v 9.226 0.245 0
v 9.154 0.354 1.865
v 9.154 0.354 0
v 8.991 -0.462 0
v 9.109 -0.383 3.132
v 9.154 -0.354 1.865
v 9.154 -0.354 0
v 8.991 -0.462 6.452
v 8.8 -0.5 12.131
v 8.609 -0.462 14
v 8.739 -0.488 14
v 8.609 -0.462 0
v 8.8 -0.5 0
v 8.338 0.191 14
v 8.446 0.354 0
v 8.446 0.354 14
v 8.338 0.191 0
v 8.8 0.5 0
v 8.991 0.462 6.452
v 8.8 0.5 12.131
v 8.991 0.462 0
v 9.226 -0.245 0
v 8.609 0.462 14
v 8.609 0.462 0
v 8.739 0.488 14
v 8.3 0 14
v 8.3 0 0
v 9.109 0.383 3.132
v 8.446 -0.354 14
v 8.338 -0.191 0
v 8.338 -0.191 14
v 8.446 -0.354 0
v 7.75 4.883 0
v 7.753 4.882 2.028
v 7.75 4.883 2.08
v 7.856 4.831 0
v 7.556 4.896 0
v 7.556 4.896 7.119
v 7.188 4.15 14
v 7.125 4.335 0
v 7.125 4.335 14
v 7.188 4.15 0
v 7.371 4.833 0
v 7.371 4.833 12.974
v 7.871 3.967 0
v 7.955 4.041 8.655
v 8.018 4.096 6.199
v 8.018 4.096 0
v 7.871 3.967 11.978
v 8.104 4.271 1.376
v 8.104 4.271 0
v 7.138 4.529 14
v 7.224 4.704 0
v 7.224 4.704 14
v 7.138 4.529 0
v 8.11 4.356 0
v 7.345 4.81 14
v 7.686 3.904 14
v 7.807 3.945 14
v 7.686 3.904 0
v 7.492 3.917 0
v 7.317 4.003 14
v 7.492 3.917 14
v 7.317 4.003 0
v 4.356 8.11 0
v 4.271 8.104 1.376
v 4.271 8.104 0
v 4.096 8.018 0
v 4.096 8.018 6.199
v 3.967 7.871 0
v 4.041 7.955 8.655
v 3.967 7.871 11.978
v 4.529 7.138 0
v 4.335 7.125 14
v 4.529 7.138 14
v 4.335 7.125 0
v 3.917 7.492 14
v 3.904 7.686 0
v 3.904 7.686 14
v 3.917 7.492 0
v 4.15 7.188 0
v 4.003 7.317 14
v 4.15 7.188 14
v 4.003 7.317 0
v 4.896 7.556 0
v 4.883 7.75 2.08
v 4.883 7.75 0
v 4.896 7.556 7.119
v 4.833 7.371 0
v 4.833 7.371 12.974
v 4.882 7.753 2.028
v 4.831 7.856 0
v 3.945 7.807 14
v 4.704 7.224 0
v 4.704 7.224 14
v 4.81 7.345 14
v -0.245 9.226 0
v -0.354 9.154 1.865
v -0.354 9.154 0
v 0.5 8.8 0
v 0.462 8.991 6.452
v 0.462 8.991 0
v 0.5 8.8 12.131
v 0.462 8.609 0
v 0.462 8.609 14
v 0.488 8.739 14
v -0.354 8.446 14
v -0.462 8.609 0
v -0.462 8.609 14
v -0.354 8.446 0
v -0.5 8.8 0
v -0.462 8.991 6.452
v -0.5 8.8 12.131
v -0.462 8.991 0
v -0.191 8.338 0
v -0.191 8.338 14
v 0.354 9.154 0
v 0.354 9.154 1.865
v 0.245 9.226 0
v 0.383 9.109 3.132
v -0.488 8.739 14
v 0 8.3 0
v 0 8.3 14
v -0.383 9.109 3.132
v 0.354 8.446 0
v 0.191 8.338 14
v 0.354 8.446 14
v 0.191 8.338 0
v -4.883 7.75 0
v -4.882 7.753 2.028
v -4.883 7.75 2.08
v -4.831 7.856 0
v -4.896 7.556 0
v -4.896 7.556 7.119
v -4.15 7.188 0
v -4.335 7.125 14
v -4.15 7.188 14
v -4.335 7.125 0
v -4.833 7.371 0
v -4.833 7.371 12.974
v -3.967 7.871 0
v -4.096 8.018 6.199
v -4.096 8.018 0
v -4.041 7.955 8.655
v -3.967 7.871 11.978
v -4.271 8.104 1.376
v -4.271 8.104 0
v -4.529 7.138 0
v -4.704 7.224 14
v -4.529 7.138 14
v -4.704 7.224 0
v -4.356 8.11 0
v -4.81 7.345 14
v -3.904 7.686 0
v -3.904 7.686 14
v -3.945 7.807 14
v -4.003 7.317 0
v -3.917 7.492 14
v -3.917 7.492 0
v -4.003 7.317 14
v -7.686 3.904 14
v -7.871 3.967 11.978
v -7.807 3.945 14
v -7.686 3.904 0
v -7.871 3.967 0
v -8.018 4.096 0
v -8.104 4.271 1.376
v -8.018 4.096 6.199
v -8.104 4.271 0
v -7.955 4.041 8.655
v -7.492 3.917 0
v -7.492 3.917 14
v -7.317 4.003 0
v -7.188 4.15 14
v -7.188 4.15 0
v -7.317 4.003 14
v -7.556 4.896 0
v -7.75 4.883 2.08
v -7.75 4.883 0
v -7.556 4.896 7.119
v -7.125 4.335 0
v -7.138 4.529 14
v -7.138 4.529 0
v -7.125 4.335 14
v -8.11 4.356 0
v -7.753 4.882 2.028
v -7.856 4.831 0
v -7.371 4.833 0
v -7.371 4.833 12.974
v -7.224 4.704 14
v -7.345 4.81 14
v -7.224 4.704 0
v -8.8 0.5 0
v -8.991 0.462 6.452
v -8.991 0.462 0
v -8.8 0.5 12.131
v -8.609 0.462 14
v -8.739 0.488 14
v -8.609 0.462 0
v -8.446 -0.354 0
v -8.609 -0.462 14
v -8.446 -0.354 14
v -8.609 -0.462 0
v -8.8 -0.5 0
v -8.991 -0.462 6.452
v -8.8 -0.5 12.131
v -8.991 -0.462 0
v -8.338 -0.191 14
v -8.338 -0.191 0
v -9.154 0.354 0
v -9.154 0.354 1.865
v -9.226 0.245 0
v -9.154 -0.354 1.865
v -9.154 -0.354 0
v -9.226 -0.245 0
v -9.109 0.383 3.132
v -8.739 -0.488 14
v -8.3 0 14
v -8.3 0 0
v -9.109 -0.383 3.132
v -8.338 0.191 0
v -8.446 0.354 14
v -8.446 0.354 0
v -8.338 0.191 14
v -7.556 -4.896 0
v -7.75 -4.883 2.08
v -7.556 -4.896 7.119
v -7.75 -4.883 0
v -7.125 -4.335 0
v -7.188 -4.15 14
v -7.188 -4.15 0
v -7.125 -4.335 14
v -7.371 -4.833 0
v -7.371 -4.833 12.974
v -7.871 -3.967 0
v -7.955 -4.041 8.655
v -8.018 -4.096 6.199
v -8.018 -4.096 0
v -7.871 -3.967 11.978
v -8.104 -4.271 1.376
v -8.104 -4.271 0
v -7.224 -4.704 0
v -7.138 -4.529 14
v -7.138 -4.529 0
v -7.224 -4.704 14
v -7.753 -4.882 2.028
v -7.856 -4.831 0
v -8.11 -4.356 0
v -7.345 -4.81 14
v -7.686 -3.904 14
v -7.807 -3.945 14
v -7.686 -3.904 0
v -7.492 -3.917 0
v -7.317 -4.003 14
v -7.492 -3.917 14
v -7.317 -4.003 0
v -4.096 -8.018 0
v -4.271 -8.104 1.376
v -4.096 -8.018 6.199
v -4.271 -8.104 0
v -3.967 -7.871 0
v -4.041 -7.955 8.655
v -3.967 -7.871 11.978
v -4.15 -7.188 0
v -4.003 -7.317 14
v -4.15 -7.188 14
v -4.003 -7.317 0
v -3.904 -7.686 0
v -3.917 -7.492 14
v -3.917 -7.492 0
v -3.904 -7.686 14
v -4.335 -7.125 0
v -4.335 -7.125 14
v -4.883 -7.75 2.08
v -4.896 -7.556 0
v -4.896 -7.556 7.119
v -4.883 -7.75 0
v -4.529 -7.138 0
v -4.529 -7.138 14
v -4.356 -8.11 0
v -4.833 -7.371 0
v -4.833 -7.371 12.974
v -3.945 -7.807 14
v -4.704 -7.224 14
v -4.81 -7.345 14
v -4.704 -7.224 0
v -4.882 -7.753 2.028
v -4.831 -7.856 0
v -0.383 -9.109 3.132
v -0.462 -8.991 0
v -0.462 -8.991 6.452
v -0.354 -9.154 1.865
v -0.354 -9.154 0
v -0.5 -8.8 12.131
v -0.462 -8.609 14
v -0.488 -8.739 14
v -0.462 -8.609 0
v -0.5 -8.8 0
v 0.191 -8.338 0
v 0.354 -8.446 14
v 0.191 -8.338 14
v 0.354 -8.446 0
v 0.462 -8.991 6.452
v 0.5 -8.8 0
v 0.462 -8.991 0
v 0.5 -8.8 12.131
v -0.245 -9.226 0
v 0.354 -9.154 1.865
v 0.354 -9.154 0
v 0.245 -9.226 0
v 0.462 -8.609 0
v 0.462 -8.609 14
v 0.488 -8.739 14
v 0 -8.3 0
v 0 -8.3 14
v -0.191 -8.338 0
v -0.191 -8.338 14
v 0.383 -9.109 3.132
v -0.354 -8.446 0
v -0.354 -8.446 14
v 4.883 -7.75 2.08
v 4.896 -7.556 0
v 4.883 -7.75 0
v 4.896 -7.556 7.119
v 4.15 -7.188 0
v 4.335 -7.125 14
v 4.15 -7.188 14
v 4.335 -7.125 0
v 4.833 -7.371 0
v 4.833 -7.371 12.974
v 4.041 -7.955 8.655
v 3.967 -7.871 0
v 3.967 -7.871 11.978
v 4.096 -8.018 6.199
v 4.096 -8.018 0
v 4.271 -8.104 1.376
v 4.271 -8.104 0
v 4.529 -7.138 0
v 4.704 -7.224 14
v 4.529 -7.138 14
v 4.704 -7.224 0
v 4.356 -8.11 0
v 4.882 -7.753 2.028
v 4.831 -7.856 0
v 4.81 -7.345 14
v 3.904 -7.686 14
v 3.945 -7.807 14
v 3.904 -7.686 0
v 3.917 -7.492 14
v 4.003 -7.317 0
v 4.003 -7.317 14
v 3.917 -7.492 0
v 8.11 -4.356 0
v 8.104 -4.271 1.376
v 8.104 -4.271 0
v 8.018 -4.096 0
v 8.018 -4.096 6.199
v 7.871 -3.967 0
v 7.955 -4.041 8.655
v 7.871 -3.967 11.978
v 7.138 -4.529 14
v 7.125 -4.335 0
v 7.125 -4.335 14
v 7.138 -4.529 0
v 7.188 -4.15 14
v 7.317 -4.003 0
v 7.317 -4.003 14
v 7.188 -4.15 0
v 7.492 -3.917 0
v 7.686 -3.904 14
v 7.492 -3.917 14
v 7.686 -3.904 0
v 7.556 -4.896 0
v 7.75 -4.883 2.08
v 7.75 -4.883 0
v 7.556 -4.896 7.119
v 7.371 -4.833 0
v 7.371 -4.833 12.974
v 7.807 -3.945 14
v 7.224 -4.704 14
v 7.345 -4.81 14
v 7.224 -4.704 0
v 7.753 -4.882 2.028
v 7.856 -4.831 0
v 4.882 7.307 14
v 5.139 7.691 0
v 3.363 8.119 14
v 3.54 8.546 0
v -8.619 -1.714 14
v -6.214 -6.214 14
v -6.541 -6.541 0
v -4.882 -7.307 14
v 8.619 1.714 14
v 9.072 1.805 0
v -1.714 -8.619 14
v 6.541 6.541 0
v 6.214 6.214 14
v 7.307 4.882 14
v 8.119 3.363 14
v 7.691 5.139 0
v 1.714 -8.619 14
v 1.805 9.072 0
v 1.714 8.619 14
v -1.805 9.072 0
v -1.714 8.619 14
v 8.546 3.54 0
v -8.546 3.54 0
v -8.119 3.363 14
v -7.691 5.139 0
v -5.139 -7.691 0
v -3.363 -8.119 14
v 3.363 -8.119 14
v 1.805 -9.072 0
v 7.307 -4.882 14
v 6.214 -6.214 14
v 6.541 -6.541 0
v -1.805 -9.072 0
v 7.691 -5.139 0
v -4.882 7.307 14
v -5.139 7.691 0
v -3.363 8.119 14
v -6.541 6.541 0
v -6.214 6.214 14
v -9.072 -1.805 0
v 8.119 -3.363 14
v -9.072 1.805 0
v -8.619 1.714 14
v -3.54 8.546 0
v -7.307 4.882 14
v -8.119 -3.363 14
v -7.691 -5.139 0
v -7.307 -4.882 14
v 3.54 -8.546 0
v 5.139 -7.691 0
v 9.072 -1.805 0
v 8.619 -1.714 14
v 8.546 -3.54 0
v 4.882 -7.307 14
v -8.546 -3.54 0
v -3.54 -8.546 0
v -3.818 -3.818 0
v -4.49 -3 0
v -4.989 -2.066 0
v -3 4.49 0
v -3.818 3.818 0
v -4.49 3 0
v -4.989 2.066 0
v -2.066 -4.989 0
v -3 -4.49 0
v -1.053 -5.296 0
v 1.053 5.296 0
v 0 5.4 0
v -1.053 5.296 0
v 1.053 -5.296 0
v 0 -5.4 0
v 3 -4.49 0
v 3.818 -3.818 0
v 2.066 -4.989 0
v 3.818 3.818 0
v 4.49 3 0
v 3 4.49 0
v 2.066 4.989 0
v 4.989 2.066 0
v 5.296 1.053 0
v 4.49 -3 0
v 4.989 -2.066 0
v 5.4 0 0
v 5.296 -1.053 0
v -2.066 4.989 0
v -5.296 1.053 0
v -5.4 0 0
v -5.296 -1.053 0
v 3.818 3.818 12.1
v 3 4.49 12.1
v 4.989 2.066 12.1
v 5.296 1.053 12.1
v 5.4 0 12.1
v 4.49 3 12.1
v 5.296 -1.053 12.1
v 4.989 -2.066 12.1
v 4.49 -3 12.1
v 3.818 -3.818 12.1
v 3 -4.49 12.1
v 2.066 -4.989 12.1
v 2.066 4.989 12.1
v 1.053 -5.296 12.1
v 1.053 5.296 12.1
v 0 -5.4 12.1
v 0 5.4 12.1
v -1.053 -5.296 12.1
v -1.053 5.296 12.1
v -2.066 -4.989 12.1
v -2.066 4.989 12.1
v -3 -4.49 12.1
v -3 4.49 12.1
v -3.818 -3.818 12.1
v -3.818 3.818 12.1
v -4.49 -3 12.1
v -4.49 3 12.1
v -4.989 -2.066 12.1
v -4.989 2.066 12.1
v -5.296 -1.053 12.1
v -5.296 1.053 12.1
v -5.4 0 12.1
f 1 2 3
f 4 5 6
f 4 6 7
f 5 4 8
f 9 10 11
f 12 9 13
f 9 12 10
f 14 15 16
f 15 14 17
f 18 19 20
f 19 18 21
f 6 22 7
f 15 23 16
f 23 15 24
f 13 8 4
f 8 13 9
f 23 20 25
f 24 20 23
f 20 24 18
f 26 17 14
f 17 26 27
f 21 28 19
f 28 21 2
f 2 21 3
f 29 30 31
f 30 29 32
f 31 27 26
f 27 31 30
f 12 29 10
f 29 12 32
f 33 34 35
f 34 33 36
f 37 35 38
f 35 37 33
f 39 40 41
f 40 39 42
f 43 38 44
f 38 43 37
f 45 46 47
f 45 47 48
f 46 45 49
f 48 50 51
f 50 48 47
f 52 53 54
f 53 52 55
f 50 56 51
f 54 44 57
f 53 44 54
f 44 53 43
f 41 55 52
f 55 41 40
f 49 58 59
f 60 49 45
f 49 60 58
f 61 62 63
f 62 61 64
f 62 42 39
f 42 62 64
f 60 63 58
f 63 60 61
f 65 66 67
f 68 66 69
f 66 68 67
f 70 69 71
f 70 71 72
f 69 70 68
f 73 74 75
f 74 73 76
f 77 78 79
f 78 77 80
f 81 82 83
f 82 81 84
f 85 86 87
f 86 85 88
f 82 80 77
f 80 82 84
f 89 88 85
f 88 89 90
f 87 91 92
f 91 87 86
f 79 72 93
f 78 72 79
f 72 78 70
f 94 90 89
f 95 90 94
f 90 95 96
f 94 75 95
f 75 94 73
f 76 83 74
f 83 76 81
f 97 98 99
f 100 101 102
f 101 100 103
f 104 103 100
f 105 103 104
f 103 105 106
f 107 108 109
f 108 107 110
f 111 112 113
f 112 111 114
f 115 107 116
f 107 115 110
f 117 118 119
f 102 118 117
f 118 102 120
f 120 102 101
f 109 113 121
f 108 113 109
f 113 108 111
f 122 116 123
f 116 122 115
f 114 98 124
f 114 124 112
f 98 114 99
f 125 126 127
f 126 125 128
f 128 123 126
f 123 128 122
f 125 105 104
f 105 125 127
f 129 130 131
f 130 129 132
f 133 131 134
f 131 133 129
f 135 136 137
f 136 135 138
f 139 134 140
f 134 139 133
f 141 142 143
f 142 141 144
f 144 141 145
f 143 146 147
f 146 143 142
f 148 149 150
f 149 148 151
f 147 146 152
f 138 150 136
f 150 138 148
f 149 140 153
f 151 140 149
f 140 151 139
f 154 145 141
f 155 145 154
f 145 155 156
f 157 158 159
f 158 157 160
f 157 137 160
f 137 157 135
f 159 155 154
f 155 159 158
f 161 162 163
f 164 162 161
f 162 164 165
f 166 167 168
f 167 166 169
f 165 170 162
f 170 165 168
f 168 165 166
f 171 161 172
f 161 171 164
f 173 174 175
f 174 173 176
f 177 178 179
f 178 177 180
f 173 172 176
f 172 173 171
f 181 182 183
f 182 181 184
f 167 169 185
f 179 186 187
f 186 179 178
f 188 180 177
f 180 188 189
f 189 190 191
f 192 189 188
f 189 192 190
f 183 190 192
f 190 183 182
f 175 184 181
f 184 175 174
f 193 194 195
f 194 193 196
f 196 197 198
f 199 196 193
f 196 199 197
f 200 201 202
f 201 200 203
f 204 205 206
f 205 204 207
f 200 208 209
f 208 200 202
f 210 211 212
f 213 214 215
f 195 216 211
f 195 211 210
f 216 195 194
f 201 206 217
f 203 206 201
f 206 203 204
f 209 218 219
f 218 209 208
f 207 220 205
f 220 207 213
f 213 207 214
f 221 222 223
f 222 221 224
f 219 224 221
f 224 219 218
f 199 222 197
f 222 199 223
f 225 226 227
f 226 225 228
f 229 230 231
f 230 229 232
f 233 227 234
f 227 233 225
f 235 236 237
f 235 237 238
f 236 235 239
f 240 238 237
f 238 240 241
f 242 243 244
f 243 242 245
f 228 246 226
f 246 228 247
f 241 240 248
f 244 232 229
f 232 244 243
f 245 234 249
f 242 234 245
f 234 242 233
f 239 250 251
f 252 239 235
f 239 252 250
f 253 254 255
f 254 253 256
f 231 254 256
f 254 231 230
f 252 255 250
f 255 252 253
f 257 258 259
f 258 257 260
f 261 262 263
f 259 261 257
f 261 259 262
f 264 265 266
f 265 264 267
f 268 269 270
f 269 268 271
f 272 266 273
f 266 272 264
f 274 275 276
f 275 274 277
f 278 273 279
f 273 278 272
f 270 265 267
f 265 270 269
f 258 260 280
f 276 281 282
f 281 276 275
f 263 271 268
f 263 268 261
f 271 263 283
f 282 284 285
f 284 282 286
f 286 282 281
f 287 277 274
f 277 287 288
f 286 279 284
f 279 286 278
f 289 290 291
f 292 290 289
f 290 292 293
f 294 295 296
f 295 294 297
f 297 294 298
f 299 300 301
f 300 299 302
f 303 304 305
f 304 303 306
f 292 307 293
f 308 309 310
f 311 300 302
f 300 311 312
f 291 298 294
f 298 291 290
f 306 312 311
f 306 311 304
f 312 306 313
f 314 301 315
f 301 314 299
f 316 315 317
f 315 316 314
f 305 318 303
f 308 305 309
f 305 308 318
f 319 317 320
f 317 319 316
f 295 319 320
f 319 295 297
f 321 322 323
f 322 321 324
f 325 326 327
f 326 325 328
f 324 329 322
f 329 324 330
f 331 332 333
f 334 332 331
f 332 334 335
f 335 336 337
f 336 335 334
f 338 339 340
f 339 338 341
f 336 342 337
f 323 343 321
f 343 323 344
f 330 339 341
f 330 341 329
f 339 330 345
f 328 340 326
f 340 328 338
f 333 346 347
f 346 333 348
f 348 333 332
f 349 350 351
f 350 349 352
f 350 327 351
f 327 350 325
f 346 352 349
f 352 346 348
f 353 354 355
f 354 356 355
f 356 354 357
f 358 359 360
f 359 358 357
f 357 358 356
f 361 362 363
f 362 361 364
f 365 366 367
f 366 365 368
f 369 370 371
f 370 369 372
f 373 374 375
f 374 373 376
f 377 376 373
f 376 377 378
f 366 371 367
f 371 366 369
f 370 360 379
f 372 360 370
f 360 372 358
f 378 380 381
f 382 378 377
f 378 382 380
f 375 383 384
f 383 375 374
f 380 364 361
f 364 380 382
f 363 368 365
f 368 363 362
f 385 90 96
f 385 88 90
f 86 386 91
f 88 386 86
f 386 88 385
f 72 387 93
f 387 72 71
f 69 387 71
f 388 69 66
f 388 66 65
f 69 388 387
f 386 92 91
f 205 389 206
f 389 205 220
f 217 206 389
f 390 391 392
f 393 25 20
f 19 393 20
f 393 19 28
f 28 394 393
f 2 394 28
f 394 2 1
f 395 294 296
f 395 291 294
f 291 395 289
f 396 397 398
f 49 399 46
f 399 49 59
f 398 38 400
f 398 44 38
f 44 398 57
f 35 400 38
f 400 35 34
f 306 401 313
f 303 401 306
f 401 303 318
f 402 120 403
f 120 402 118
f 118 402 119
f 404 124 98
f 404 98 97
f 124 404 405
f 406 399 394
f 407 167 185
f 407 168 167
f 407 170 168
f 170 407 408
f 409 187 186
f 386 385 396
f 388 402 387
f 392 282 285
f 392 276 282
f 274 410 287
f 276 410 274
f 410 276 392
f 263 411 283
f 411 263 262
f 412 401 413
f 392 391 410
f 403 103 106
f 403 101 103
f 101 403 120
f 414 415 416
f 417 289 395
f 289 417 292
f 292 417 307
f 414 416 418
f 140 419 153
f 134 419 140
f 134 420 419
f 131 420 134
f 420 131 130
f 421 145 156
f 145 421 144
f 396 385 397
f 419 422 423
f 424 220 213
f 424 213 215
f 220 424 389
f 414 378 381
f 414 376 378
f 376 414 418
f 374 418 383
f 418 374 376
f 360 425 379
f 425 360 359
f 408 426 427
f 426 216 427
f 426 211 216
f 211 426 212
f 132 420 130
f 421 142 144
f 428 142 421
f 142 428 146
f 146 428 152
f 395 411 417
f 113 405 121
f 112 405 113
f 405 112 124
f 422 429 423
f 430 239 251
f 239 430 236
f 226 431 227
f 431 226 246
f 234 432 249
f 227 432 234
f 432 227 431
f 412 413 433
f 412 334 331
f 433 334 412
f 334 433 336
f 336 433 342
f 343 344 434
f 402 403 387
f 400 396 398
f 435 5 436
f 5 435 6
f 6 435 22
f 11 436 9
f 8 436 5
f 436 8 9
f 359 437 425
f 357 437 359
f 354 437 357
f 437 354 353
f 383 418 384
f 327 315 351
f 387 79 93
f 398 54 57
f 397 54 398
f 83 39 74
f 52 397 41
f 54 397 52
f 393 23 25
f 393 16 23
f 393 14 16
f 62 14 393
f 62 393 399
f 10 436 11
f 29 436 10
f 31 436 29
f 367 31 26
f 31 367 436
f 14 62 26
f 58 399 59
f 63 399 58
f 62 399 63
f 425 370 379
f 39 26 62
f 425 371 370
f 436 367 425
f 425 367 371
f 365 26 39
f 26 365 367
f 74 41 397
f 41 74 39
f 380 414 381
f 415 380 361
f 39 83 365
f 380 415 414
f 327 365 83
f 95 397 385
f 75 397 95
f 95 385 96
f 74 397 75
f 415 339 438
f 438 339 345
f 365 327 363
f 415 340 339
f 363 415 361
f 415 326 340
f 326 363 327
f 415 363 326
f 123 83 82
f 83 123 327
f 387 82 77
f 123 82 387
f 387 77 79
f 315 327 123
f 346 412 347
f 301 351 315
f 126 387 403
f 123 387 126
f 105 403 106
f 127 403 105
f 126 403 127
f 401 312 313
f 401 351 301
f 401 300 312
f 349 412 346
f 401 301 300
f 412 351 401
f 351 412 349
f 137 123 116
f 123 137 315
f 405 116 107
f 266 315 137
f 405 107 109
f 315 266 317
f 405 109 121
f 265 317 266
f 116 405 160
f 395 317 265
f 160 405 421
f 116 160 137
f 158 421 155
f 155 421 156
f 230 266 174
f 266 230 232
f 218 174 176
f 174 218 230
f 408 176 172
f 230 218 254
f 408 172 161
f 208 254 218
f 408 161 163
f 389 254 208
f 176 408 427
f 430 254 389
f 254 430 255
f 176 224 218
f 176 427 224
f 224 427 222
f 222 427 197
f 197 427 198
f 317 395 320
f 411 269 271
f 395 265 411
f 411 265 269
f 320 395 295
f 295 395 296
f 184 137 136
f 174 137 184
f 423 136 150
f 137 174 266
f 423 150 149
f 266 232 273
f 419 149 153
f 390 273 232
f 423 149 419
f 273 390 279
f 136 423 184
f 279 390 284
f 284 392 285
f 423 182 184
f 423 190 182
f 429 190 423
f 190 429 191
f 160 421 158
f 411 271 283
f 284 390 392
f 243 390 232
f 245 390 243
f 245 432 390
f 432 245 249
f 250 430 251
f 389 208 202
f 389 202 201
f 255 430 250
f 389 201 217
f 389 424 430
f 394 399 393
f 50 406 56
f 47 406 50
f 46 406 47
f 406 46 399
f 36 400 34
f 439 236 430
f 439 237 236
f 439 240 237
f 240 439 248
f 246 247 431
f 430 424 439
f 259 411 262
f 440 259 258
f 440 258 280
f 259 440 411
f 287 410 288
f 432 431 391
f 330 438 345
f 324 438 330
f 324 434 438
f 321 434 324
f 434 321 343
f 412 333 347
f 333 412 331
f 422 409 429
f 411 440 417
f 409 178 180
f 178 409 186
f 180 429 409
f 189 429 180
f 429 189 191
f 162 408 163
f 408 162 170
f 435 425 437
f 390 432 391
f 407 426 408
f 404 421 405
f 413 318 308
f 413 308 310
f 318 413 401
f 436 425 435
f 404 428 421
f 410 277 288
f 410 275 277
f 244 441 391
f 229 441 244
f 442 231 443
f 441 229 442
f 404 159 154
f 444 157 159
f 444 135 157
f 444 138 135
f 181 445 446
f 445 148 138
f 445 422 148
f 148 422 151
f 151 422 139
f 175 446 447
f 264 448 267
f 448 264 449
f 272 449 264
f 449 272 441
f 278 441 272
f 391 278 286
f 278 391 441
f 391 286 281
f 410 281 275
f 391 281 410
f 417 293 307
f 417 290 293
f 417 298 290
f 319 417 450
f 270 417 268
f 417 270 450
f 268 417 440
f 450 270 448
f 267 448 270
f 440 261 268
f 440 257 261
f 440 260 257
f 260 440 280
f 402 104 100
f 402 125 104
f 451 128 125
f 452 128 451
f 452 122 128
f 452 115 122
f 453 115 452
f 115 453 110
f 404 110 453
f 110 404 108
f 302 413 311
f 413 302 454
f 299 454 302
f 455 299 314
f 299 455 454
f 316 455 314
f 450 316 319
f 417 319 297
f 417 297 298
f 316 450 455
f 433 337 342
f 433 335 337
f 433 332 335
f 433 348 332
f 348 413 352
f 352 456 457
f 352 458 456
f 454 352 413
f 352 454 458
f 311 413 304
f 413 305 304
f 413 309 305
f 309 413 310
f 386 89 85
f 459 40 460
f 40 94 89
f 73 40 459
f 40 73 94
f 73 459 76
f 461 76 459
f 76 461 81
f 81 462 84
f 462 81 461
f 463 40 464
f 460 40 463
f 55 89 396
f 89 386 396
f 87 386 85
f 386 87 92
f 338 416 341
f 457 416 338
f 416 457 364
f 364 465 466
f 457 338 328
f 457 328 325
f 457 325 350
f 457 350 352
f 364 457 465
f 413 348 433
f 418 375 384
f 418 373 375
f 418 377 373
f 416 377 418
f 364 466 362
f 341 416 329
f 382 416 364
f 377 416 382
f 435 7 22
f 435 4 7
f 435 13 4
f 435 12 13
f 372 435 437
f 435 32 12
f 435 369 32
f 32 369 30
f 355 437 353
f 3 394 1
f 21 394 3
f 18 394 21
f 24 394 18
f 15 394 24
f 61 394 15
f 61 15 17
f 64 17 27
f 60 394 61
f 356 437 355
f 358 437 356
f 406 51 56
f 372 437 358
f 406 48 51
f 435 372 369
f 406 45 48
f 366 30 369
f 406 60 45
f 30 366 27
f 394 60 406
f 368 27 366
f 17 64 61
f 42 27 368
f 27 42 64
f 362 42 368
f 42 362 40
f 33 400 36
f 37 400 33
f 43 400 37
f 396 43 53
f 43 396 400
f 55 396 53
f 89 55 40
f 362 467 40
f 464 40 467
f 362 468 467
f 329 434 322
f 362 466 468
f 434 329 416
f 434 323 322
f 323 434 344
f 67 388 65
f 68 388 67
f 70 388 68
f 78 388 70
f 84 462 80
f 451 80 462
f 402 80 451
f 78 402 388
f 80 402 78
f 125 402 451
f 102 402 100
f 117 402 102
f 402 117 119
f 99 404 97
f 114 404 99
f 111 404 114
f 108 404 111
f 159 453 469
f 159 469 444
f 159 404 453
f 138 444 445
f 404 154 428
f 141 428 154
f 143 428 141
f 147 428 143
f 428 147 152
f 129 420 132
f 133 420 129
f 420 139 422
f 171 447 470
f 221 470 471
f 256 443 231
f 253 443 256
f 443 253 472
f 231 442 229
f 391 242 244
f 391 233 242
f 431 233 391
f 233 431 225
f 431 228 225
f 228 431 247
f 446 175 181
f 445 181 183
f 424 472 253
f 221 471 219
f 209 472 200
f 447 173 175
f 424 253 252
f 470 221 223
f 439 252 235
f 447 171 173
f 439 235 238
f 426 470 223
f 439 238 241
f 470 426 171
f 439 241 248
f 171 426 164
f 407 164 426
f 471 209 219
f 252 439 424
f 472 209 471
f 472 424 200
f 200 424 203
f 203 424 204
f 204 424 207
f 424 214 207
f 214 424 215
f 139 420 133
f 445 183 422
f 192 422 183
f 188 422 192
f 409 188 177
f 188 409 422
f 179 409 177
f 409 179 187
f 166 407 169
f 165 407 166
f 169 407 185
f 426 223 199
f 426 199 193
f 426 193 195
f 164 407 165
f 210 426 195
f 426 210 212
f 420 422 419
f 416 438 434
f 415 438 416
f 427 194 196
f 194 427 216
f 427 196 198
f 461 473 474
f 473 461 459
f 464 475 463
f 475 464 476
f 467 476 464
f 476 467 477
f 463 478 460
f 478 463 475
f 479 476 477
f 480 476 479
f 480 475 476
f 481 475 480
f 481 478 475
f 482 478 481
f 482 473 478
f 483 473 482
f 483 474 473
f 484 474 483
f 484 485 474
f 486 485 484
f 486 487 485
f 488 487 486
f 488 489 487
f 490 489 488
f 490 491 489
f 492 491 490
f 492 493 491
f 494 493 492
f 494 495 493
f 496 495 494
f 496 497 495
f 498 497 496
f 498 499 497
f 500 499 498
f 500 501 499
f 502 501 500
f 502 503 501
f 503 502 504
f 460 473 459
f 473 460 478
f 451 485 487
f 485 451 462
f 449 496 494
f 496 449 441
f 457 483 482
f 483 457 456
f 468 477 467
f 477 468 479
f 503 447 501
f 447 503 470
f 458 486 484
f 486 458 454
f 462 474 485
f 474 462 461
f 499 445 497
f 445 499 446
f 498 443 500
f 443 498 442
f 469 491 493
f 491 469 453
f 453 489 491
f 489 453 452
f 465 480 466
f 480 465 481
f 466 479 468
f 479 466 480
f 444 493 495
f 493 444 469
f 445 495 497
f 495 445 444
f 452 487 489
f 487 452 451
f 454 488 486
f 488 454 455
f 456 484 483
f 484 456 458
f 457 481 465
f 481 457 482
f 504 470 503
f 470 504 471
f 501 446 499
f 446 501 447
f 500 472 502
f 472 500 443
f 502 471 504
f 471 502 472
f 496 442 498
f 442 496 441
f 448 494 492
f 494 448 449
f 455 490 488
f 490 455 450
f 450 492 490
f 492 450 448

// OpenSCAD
// ACCESS KNOB — Din Sync RE-303 Volume / Power Knob (Slip-On Sleeve)
// Generated via CLI for Studio Knobs (Slip-On Sleeve)
module access_knob_re303_vol_slipon() {
  outer_d = 18.5;
  height = 14;
  taper = 0.95;
  bore_d = 10.5;
  slot_h = 12;
  tex_depth = 0.9;
  tex_scale = 1;
  tex_count = 12;

  difference() {
    cylinder(h=height, d1=outer_d, d2=outer_d*taper, $fn=32);
    translate([0,0,-0.1]) cylinder(h=slot_h+0.2, d=bore_d + 0.3, $fn=32);
    for(i=[0:tex_count-1]) {
      rotate([0,0,i*(360/tex_count)])
        translate([outer_d/2-tex_depth/2, 0, height/2])
          cylinder(h=height*1.1, d=tex_scale, center=true, $fn=16);
    }
  }
}
access_knob_re303_vol_slipon();
